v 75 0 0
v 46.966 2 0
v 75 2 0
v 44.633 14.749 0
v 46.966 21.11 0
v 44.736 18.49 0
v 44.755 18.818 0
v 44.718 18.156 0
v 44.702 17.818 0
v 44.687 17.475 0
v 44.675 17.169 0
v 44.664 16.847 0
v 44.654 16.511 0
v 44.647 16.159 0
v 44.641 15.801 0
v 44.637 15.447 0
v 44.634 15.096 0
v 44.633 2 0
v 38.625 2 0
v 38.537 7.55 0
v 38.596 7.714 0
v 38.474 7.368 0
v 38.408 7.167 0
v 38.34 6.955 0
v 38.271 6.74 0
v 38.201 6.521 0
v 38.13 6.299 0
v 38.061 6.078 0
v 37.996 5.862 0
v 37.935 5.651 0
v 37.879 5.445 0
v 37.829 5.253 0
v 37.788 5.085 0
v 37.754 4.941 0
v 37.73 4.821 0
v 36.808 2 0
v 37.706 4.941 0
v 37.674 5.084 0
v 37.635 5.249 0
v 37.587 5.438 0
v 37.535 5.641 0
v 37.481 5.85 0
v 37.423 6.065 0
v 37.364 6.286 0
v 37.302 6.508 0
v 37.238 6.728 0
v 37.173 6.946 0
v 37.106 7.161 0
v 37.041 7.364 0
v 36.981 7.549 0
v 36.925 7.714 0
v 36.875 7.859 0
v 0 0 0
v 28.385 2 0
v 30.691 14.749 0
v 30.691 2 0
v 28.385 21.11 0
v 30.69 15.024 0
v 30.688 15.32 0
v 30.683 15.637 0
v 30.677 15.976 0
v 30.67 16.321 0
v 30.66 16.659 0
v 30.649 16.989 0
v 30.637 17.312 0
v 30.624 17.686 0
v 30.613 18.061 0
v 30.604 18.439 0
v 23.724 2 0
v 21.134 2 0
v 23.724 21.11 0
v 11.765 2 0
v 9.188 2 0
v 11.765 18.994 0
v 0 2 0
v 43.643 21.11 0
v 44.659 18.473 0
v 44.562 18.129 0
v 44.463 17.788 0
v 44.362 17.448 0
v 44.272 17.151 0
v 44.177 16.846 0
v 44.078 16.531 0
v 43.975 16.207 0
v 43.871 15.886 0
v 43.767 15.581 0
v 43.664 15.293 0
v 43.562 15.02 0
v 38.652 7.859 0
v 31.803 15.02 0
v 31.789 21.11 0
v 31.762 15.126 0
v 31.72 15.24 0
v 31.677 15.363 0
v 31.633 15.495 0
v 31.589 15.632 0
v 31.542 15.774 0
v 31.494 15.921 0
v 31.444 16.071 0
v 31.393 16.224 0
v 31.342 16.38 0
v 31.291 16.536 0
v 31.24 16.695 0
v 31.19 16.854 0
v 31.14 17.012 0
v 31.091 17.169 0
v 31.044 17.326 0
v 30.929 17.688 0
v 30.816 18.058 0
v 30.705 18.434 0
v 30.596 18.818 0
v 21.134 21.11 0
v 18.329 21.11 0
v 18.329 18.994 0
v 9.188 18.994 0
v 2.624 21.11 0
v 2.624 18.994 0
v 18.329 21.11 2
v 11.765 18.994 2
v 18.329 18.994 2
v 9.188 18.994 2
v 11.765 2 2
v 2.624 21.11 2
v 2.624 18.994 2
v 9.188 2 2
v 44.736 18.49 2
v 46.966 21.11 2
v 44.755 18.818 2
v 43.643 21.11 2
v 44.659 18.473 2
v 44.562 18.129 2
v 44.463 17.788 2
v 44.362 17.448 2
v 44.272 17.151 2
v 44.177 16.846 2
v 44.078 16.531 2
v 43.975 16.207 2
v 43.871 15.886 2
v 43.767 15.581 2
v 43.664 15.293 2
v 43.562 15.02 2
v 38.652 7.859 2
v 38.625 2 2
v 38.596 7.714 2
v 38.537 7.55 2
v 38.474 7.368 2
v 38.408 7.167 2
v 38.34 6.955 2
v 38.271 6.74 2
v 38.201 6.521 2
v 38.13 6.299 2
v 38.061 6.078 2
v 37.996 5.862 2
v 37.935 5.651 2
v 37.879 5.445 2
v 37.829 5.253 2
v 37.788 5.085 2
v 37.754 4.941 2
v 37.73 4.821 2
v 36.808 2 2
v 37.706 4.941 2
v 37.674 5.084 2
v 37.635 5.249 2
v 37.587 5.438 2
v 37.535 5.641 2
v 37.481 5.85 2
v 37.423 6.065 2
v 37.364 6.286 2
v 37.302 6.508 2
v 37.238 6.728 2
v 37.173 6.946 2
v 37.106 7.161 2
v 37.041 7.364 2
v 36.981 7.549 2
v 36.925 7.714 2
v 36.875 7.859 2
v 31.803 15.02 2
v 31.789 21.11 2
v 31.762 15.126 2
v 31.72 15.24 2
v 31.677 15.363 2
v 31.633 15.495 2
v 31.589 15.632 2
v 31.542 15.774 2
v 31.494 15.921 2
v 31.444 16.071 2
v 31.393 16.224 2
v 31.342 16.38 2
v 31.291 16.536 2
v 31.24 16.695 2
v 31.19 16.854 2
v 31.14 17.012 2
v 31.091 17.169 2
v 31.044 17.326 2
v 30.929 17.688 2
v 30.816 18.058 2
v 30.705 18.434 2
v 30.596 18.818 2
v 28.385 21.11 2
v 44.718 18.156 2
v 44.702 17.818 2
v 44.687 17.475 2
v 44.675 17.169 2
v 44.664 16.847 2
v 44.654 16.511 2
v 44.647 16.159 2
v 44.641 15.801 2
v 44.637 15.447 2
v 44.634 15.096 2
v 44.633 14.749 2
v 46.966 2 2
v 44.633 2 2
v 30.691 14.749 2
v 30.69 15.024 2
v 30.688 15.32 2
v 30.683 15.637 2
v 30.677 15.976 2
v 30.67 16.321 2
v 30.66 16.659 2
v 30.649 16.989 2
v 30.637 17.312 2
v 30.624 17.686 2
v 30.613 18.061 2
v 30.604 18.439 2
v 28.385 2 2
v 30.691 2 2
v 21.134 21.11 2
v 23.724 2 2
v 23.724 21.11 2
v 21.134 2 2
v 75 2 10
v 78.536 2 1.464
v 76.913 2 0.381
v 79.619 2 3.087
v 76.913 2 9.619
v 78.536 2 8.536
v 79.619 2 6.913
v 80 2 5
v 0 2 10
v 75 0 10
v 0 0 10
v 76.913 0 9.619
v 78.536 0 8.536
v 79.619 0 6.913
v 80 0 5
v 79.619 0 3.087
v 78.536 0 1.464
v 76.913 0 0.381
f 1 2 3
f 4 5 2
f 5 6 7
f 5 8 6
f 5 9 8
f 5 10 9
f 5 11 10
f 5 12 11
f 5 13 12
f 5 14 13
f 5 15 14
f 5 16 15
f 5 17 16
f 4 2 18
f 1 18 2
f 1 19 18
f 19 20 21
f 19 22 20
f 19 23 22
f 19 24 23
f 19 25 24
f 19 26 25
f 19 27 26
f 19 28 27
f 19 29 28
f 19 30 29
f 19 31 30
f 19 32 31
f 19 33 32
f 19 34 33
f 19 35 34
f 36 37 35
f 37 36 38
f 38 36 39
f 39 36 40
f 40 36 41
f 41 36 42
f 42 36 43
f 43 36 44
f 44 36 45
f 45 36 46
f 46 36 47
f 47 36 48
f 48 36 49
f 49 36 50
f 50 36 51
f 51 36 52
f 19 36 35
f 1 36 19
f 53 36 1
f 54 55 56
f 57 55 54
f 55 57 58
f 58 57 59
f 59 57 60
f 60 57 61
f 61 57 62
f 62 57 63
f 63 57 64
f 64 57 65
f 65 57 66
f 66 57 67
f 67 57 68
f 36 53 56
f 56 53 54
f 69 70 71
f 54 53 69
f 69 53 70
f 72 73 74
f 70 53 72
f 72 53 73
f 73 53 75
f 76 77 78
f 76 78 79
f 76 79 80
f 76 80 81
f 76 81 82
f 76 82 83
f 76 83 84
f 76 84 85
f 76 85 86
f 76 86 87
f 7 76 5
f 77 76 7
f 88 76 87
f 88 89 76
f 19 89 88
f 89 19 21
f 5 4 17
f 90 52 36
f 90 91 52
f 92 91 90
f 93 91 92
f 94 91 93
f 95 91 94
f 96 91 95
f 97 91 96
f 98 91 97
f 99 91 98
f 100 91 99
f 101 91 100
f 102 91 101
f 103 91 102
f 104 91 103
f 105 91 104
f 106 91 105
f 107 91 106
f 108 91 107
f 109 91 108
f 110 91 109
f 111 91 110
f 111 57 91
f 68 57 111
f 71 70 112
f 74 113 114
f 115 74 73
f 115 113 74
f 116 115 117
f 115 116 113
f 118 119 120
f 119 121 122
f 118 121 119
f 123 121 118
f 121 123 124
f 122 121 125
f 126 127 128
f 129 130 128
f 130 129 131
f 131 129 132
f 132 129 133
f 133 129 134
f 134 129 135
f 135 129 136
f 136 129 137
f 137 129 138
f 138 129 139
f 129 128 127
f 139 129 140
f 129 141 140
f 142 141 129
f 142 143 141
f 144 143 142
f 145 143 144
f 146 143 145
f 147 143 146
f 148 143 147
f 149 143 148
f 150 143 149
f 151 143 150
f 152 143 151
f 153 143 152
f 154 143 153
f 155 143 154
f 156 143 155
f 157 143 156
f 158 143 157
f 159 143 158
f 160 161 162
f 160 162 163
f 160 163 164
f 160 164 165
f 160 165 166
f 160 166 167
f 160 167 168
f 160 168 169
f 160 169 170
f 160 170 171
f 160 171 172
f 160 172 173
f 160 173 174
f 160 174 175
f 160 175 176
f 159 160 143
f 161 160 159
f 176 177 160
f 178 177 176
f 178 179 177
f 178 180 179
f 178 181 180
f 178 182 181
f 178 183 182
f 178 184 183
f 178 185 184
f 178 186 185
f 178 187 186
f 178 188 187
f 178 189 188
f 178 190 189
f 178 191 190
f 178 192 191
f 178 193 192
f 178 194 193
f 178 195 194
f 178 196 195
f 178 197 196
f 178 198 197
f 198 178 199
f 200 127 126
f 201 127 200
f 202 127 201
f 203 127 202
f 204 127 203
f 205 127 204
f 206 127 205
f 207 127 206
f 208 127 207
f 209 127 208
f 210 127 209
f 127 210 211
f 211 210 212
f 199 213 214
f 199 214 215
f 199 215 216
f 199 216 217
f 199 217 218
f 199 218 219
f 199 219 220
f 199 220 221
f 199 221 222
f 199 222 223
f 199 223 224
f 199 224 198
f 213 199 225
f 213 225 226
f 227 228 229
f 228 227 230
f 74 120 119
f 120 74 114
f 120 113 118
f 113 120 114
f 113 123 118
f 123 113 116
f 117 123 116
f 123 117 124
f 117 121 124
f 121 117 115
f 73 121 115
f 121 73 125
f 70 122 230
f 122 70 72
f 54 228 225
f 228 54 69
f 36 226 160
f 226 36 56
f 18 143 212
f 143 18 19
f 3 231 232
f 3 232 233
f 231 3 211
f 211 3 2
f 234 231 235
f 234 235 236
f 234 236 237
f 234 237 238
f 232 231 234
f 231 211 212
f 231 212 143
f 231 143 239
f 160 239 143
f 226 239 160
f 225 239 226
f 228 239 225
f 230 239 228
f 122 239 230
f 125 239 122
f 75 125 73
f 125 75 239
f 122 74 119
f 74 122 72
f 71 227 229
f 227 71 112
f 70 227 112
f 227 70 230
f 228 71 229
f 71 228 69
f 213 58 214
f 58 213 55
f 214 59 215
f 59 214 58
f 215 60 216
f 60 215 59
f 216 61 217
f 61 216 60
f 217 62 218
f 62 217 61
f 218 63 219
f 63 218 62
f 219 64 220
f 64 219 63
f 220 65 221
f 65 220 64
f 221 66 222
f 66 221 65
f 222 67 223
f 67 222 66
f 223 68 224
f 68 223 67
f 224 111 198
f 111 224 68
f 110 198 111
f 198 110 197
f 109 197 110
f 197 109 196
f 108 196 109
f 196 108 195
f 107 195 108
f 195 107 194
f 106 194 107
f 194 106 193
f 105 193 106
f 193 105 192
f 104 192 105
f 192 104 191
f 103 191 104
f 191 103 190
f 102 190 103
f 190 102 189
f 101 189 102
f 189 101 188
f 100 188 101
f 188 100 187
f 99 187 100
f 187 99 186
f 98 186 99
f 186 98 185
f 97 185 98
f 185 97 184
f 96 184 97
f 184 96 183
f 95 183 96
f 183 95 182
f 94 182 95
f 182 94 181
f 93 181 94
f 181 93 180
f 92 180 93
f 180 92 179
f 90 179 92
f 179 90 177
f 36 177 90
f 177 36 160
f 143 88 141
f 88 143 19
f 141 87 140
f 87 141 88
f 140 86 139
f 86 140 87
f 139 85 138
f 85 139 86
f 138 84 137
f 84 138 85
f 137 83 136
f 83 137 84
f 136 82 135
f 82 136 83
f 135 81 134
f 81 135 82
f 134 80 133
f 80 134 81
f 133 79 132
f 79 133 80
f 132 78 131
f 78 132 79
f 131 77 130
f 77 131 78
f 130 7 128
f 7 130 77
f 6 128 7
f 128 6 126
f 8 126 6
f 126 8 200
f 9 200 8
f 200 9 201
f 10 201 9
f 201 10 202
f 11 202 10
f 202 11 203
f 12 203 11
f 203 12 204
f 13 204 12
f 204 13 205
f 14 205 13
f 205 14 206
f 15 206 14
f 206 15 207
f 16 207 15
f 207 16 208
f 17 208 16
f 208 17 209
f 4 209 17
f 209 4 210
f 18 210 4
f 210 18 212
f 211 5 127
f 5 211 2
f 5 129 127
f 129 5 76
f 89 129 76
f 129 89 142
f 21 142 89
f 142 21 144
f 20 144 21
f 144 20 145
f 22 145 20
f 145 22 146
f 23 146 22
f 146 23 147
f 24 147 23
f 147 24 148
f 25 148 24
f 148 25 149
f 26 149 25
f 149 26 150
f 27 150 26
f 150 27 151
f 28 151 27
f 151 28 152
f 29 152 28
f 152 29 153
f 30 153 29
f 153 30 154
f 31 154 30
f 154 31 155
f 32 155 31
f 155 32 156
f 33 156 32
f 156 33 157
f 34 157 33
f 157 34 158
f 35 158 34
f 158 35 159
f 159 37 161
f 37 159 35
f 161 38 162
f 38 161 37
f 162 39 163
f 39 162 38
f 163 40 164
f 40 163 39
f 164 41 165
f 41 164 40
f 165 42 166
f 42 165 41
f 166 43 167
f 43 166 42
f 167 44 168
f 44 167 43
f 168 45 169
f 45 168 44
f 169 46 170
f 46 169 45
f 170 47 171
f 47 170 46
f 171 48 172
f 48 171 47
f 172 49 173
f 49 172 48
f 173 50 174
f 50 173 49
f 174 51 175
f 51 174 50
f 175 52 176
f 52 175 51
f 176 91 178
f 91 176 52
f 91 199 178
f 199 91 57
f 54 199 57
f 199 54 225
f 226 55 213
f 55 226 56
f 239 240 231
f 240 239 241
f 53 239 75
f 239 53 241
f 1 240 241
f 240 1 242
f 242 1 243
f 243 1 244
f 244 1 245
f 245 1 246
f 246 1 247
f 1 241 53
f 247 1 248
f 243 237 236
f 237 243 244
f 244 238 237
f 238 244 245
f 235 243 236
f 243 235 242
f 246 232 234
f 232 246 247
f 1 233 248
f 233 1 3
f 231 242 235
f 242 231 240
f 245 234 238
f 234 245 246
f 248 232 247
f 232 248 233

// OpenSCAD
translate([2, 2, 0])
linear_extrude(height=2)
    text("TIM", 20, "Arial");

cube([75, 2, 10]);

translate([75, 2, 5])
rotate([90, 0, 0])
cylinder(h=2, r=5);
